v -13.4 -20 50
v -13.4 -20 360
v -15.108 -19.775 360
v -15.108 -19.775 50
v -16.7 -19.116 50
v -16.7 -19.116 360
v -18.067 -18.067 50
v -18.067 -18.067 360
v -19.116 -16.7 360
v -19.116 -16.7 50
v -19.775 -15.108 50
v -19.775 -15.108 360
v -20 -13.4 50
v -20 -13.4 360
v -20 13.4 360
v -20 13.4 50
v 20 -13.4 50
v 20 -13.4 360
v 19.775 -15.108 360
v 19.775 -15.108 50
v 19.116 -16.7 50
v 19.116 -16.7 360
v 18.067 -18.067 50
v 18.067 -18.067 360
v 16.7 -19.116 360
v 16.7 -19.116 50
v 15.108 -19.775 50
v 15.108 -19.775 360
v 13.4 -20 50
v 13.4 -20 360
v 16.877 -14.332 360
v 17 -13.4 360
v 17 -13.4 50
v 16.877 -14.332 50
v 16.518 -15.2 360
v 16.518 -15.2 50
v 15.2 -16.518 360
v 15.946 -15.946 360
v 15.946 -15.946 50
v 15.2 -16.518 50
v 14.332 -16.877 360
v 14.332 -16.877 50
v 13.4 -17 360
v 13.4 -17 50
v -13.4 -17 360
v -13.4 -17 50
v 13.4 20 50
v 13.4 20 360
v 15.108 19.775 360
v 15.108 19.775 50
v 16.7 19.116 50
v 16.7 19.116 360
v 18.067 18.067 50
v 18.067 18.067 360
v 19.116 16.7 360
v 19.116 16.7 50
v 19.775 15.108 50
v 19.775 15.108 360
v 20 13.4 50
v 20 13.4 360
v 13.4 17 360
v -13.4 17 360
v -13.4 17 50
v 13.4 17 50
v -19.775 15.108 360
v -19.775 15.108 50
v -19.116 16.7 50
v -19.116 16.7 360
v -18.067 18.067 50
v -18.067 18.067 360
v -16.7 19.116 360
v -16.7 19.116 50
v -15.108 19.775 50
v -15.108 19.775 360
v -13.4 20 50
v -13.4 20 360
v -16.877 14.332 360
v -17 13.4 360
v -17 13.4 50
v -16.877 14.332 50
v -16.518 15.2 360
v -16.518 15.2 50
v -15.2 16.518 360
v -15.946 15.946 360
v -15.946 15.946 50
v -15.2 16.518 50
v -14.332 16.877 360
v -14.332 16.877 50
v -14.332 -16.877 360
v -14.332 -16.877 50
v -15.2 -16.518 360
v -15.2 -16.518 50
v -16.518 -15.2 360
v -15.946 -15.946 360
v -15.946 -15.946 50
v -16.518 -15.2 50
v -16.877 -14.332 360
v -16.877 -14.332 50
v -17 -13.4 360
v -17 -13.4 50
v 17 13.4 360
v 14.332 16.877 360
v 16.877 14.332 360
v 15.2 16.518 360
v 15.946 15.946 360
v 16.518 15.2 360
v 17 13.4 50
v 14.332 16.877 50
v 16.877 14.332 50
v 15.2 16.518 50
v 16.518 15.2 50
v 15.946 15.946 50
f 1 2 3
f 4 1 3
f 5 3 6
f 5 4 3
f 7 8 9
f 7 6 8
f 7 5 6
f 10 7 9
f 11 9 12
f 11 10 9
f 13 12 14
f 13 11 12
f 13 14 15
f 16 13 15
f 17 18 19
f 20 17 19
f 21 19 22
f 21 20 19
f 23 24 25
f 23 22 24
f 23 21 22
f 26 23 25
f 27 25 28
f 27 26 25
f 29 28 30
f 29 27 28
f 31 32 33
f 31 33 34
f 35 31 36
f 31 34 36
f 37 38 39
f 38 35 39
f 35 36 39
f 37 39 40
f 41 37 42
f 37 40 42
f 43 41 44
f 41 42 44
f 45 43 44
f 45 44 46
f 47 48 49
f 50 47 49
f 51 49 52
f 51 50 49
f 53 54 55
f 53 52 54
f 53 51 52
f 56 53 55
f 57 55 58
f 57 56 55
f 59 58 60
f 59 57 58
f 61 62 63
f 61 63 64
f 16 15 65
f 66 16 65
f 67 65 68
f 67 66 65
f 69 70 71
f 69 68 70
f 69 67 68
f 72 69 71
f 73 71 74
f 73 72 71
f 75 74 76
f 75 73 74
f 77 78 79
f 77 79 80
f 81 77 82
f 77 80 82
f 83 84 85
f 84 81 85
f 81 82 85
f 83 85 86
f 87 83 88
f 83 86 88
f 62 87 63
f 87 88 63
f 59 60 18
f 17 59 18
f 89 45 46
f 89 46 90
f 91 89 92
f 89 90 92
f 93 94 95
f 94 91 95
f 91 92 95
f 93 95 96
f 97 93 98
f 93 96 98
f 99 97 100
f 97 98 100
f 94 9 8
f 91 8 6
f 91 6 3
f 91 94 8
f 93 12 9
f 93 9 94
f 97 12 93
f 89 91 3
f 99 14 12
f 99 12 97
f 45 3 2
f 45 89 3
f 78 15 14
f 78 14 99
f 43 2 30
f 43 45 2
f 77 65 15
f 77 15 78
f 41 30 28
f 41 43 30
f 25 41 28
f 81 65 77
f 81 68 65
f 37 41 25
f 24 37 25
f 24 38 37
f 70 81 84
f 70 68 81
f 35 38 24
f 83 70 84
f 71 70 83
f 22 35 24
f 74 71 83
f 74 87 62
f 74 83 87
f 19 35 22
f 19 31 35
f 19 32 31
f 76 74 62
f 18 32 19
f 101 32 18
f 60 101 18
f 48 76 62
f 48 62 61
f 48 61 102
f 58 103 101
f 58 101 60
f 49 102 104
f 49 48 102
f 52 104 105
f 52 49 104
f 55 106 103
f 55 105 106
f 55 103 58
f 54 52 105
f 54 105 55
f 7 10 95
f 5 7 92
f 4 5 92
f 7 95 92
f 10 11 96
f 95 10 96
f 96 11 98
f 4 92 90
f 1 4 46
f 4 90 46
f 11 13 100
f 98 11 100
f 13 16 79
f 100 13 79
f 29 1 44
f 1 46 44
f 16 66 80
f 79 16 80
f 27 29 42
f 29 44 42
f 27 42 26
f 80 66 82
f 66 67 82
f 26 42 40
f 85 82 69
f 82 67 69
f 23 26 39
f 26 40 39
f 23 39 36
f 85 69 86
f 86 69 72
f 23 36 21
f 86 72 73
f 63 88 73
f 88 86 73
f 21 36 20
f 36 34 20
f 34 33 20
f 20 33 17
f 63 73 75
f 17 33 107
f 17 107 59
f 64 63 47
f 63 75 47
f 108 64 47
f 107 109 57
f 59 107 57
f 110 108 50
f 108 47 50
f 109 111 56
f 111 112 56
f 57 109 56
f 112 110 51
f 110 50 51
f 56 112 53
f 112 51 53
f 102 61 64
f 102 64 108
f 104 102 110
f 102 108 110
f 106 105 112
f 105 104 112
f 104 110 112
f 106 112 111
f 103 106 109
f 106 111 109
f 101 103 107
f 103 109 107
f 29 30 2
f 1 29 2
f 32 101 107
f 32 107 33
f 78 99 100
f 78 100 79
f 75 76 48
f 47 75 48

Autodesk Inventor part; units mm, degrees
ref_plane "Start plane" through (0, 0, 50) normal (0, 0, 1) x (1, 0, 0)
ref_plane "End plane" through (0, 0, 360) normal (0, 0, 1) x (1, 0, 0)
sketch "Sketch" plane through (0, 0, 0) normal (0, 0, 1) x (1, 0, 0)
  line L0 (-20, -13.4) -> (-20, 13.4)
  line L1 (-13.4, 20) -> (13.4, 20)
  line L2 (20, 13.4) -> (20, -13.4)
  line L3 (13.4, -20) -> (-13.4, -20)
  arc A0 (-20, -13.4) -> (-13.4, -20) centre (-13.4, -13.4) ccw
  arc A1 (-13.4, 20) -> (-20, 13.4) centre (-13.4, 13.4) ccw
  arc A2 (20, 13.4) -> (13.4, 20) centre (13.4, 13.4) ccw
  arc A3 (13.4, -20) -> (20, -13.4) centre (13.4, -13.4) ccw
  arc A4 (-13.4, 17) -> (-17, 13.4) centre (-13.4, 13.4) ccw
  line L4 (-13.4, 17) -> (13.4, 17)
  arc A5 (17, 13.4) -> (13.4, 17) centre (13.4, 13.4) ccw
  line L5 (17, 13.4) -> (17, -13.4)
  arc A6 (13.4, -17) -> (17, -13.4) centre (13.4, -13.4) ccw
  line L6 (13.4, -17) -> (-13.4, -17)
  arc A7 (-17, -13.4) -> (-13.4, -17) centre (-13.4, -13.4) ccw
  line L7 (-17, -13.4) -> (-17, 13.4)
  line L8 (0, 22.0873) -> (0, -22.0873) construction
  line L9 (-22.0873, 0) -> (22.0873, 0) construction
  dimension "d7" = 6.6
  dimension "d10" = 40
  dimension "d11" = 40
  dimension "d12" = 3
  dimension "d15" = 20
  dimension "d16" = 20
extrude "Body" add sketch "Sketch" along normal up to surface (310 mm away) from surface at 50
sketch "Sketch3" plane through (0, 0, 0) normal (0, 0, 1) x (1, 0, 0)
  line L0 (0, 0) -> (10, 0)
ref_plane "Work Plane3" through (0, 0, 0) normal (0, -1, 0) x (1, 0, 0)
sketch "Sketch4" plane through (0, 0, 0) normal (0, -1, 0) x (1, 0, 0)
  line L0 (-2, 50) -> (12, 50)
  line L1 (-2, 360) -> (12, 360)
  dimension "d18" = 310
ref_plane "Work Plane4" through (-9.2, 565, 50) normal (0, 0, -1) x (-1, 0, 0)
split "Split1" plane through (-9.2, 565, 50) removes the side toward (0, 0, -1)
ref_plane "Work Plane5" through (636, -8.4, 360) normal (0, 0, 1) x (1, 0, 0)
split "Split2" plane through (636, -8.4, 360) removes the side toward (0, 0, 1)
equation "\"d7\" = G_IR"
equation "\"d10\" = G_H"
equation "\"d11\" = G_W"
equation "\"d12\" = G_T"
equation "\"d15\" = 0.5 * d10"
equation "\"d16\" = 0.5 * d11"
equation "\"d3\" = G_L"
equation "\"G_W\" = 40"
equation "\"G_H\" = 40"
equation "\"G_T\" = 3"
equation "\"G_IR\" = 6.6"
equation "\"G_L\" = d18"
properties part number "DIN EN 10305-5 - 40 x 40 x 3  - 310" material "Steel, Mild"
